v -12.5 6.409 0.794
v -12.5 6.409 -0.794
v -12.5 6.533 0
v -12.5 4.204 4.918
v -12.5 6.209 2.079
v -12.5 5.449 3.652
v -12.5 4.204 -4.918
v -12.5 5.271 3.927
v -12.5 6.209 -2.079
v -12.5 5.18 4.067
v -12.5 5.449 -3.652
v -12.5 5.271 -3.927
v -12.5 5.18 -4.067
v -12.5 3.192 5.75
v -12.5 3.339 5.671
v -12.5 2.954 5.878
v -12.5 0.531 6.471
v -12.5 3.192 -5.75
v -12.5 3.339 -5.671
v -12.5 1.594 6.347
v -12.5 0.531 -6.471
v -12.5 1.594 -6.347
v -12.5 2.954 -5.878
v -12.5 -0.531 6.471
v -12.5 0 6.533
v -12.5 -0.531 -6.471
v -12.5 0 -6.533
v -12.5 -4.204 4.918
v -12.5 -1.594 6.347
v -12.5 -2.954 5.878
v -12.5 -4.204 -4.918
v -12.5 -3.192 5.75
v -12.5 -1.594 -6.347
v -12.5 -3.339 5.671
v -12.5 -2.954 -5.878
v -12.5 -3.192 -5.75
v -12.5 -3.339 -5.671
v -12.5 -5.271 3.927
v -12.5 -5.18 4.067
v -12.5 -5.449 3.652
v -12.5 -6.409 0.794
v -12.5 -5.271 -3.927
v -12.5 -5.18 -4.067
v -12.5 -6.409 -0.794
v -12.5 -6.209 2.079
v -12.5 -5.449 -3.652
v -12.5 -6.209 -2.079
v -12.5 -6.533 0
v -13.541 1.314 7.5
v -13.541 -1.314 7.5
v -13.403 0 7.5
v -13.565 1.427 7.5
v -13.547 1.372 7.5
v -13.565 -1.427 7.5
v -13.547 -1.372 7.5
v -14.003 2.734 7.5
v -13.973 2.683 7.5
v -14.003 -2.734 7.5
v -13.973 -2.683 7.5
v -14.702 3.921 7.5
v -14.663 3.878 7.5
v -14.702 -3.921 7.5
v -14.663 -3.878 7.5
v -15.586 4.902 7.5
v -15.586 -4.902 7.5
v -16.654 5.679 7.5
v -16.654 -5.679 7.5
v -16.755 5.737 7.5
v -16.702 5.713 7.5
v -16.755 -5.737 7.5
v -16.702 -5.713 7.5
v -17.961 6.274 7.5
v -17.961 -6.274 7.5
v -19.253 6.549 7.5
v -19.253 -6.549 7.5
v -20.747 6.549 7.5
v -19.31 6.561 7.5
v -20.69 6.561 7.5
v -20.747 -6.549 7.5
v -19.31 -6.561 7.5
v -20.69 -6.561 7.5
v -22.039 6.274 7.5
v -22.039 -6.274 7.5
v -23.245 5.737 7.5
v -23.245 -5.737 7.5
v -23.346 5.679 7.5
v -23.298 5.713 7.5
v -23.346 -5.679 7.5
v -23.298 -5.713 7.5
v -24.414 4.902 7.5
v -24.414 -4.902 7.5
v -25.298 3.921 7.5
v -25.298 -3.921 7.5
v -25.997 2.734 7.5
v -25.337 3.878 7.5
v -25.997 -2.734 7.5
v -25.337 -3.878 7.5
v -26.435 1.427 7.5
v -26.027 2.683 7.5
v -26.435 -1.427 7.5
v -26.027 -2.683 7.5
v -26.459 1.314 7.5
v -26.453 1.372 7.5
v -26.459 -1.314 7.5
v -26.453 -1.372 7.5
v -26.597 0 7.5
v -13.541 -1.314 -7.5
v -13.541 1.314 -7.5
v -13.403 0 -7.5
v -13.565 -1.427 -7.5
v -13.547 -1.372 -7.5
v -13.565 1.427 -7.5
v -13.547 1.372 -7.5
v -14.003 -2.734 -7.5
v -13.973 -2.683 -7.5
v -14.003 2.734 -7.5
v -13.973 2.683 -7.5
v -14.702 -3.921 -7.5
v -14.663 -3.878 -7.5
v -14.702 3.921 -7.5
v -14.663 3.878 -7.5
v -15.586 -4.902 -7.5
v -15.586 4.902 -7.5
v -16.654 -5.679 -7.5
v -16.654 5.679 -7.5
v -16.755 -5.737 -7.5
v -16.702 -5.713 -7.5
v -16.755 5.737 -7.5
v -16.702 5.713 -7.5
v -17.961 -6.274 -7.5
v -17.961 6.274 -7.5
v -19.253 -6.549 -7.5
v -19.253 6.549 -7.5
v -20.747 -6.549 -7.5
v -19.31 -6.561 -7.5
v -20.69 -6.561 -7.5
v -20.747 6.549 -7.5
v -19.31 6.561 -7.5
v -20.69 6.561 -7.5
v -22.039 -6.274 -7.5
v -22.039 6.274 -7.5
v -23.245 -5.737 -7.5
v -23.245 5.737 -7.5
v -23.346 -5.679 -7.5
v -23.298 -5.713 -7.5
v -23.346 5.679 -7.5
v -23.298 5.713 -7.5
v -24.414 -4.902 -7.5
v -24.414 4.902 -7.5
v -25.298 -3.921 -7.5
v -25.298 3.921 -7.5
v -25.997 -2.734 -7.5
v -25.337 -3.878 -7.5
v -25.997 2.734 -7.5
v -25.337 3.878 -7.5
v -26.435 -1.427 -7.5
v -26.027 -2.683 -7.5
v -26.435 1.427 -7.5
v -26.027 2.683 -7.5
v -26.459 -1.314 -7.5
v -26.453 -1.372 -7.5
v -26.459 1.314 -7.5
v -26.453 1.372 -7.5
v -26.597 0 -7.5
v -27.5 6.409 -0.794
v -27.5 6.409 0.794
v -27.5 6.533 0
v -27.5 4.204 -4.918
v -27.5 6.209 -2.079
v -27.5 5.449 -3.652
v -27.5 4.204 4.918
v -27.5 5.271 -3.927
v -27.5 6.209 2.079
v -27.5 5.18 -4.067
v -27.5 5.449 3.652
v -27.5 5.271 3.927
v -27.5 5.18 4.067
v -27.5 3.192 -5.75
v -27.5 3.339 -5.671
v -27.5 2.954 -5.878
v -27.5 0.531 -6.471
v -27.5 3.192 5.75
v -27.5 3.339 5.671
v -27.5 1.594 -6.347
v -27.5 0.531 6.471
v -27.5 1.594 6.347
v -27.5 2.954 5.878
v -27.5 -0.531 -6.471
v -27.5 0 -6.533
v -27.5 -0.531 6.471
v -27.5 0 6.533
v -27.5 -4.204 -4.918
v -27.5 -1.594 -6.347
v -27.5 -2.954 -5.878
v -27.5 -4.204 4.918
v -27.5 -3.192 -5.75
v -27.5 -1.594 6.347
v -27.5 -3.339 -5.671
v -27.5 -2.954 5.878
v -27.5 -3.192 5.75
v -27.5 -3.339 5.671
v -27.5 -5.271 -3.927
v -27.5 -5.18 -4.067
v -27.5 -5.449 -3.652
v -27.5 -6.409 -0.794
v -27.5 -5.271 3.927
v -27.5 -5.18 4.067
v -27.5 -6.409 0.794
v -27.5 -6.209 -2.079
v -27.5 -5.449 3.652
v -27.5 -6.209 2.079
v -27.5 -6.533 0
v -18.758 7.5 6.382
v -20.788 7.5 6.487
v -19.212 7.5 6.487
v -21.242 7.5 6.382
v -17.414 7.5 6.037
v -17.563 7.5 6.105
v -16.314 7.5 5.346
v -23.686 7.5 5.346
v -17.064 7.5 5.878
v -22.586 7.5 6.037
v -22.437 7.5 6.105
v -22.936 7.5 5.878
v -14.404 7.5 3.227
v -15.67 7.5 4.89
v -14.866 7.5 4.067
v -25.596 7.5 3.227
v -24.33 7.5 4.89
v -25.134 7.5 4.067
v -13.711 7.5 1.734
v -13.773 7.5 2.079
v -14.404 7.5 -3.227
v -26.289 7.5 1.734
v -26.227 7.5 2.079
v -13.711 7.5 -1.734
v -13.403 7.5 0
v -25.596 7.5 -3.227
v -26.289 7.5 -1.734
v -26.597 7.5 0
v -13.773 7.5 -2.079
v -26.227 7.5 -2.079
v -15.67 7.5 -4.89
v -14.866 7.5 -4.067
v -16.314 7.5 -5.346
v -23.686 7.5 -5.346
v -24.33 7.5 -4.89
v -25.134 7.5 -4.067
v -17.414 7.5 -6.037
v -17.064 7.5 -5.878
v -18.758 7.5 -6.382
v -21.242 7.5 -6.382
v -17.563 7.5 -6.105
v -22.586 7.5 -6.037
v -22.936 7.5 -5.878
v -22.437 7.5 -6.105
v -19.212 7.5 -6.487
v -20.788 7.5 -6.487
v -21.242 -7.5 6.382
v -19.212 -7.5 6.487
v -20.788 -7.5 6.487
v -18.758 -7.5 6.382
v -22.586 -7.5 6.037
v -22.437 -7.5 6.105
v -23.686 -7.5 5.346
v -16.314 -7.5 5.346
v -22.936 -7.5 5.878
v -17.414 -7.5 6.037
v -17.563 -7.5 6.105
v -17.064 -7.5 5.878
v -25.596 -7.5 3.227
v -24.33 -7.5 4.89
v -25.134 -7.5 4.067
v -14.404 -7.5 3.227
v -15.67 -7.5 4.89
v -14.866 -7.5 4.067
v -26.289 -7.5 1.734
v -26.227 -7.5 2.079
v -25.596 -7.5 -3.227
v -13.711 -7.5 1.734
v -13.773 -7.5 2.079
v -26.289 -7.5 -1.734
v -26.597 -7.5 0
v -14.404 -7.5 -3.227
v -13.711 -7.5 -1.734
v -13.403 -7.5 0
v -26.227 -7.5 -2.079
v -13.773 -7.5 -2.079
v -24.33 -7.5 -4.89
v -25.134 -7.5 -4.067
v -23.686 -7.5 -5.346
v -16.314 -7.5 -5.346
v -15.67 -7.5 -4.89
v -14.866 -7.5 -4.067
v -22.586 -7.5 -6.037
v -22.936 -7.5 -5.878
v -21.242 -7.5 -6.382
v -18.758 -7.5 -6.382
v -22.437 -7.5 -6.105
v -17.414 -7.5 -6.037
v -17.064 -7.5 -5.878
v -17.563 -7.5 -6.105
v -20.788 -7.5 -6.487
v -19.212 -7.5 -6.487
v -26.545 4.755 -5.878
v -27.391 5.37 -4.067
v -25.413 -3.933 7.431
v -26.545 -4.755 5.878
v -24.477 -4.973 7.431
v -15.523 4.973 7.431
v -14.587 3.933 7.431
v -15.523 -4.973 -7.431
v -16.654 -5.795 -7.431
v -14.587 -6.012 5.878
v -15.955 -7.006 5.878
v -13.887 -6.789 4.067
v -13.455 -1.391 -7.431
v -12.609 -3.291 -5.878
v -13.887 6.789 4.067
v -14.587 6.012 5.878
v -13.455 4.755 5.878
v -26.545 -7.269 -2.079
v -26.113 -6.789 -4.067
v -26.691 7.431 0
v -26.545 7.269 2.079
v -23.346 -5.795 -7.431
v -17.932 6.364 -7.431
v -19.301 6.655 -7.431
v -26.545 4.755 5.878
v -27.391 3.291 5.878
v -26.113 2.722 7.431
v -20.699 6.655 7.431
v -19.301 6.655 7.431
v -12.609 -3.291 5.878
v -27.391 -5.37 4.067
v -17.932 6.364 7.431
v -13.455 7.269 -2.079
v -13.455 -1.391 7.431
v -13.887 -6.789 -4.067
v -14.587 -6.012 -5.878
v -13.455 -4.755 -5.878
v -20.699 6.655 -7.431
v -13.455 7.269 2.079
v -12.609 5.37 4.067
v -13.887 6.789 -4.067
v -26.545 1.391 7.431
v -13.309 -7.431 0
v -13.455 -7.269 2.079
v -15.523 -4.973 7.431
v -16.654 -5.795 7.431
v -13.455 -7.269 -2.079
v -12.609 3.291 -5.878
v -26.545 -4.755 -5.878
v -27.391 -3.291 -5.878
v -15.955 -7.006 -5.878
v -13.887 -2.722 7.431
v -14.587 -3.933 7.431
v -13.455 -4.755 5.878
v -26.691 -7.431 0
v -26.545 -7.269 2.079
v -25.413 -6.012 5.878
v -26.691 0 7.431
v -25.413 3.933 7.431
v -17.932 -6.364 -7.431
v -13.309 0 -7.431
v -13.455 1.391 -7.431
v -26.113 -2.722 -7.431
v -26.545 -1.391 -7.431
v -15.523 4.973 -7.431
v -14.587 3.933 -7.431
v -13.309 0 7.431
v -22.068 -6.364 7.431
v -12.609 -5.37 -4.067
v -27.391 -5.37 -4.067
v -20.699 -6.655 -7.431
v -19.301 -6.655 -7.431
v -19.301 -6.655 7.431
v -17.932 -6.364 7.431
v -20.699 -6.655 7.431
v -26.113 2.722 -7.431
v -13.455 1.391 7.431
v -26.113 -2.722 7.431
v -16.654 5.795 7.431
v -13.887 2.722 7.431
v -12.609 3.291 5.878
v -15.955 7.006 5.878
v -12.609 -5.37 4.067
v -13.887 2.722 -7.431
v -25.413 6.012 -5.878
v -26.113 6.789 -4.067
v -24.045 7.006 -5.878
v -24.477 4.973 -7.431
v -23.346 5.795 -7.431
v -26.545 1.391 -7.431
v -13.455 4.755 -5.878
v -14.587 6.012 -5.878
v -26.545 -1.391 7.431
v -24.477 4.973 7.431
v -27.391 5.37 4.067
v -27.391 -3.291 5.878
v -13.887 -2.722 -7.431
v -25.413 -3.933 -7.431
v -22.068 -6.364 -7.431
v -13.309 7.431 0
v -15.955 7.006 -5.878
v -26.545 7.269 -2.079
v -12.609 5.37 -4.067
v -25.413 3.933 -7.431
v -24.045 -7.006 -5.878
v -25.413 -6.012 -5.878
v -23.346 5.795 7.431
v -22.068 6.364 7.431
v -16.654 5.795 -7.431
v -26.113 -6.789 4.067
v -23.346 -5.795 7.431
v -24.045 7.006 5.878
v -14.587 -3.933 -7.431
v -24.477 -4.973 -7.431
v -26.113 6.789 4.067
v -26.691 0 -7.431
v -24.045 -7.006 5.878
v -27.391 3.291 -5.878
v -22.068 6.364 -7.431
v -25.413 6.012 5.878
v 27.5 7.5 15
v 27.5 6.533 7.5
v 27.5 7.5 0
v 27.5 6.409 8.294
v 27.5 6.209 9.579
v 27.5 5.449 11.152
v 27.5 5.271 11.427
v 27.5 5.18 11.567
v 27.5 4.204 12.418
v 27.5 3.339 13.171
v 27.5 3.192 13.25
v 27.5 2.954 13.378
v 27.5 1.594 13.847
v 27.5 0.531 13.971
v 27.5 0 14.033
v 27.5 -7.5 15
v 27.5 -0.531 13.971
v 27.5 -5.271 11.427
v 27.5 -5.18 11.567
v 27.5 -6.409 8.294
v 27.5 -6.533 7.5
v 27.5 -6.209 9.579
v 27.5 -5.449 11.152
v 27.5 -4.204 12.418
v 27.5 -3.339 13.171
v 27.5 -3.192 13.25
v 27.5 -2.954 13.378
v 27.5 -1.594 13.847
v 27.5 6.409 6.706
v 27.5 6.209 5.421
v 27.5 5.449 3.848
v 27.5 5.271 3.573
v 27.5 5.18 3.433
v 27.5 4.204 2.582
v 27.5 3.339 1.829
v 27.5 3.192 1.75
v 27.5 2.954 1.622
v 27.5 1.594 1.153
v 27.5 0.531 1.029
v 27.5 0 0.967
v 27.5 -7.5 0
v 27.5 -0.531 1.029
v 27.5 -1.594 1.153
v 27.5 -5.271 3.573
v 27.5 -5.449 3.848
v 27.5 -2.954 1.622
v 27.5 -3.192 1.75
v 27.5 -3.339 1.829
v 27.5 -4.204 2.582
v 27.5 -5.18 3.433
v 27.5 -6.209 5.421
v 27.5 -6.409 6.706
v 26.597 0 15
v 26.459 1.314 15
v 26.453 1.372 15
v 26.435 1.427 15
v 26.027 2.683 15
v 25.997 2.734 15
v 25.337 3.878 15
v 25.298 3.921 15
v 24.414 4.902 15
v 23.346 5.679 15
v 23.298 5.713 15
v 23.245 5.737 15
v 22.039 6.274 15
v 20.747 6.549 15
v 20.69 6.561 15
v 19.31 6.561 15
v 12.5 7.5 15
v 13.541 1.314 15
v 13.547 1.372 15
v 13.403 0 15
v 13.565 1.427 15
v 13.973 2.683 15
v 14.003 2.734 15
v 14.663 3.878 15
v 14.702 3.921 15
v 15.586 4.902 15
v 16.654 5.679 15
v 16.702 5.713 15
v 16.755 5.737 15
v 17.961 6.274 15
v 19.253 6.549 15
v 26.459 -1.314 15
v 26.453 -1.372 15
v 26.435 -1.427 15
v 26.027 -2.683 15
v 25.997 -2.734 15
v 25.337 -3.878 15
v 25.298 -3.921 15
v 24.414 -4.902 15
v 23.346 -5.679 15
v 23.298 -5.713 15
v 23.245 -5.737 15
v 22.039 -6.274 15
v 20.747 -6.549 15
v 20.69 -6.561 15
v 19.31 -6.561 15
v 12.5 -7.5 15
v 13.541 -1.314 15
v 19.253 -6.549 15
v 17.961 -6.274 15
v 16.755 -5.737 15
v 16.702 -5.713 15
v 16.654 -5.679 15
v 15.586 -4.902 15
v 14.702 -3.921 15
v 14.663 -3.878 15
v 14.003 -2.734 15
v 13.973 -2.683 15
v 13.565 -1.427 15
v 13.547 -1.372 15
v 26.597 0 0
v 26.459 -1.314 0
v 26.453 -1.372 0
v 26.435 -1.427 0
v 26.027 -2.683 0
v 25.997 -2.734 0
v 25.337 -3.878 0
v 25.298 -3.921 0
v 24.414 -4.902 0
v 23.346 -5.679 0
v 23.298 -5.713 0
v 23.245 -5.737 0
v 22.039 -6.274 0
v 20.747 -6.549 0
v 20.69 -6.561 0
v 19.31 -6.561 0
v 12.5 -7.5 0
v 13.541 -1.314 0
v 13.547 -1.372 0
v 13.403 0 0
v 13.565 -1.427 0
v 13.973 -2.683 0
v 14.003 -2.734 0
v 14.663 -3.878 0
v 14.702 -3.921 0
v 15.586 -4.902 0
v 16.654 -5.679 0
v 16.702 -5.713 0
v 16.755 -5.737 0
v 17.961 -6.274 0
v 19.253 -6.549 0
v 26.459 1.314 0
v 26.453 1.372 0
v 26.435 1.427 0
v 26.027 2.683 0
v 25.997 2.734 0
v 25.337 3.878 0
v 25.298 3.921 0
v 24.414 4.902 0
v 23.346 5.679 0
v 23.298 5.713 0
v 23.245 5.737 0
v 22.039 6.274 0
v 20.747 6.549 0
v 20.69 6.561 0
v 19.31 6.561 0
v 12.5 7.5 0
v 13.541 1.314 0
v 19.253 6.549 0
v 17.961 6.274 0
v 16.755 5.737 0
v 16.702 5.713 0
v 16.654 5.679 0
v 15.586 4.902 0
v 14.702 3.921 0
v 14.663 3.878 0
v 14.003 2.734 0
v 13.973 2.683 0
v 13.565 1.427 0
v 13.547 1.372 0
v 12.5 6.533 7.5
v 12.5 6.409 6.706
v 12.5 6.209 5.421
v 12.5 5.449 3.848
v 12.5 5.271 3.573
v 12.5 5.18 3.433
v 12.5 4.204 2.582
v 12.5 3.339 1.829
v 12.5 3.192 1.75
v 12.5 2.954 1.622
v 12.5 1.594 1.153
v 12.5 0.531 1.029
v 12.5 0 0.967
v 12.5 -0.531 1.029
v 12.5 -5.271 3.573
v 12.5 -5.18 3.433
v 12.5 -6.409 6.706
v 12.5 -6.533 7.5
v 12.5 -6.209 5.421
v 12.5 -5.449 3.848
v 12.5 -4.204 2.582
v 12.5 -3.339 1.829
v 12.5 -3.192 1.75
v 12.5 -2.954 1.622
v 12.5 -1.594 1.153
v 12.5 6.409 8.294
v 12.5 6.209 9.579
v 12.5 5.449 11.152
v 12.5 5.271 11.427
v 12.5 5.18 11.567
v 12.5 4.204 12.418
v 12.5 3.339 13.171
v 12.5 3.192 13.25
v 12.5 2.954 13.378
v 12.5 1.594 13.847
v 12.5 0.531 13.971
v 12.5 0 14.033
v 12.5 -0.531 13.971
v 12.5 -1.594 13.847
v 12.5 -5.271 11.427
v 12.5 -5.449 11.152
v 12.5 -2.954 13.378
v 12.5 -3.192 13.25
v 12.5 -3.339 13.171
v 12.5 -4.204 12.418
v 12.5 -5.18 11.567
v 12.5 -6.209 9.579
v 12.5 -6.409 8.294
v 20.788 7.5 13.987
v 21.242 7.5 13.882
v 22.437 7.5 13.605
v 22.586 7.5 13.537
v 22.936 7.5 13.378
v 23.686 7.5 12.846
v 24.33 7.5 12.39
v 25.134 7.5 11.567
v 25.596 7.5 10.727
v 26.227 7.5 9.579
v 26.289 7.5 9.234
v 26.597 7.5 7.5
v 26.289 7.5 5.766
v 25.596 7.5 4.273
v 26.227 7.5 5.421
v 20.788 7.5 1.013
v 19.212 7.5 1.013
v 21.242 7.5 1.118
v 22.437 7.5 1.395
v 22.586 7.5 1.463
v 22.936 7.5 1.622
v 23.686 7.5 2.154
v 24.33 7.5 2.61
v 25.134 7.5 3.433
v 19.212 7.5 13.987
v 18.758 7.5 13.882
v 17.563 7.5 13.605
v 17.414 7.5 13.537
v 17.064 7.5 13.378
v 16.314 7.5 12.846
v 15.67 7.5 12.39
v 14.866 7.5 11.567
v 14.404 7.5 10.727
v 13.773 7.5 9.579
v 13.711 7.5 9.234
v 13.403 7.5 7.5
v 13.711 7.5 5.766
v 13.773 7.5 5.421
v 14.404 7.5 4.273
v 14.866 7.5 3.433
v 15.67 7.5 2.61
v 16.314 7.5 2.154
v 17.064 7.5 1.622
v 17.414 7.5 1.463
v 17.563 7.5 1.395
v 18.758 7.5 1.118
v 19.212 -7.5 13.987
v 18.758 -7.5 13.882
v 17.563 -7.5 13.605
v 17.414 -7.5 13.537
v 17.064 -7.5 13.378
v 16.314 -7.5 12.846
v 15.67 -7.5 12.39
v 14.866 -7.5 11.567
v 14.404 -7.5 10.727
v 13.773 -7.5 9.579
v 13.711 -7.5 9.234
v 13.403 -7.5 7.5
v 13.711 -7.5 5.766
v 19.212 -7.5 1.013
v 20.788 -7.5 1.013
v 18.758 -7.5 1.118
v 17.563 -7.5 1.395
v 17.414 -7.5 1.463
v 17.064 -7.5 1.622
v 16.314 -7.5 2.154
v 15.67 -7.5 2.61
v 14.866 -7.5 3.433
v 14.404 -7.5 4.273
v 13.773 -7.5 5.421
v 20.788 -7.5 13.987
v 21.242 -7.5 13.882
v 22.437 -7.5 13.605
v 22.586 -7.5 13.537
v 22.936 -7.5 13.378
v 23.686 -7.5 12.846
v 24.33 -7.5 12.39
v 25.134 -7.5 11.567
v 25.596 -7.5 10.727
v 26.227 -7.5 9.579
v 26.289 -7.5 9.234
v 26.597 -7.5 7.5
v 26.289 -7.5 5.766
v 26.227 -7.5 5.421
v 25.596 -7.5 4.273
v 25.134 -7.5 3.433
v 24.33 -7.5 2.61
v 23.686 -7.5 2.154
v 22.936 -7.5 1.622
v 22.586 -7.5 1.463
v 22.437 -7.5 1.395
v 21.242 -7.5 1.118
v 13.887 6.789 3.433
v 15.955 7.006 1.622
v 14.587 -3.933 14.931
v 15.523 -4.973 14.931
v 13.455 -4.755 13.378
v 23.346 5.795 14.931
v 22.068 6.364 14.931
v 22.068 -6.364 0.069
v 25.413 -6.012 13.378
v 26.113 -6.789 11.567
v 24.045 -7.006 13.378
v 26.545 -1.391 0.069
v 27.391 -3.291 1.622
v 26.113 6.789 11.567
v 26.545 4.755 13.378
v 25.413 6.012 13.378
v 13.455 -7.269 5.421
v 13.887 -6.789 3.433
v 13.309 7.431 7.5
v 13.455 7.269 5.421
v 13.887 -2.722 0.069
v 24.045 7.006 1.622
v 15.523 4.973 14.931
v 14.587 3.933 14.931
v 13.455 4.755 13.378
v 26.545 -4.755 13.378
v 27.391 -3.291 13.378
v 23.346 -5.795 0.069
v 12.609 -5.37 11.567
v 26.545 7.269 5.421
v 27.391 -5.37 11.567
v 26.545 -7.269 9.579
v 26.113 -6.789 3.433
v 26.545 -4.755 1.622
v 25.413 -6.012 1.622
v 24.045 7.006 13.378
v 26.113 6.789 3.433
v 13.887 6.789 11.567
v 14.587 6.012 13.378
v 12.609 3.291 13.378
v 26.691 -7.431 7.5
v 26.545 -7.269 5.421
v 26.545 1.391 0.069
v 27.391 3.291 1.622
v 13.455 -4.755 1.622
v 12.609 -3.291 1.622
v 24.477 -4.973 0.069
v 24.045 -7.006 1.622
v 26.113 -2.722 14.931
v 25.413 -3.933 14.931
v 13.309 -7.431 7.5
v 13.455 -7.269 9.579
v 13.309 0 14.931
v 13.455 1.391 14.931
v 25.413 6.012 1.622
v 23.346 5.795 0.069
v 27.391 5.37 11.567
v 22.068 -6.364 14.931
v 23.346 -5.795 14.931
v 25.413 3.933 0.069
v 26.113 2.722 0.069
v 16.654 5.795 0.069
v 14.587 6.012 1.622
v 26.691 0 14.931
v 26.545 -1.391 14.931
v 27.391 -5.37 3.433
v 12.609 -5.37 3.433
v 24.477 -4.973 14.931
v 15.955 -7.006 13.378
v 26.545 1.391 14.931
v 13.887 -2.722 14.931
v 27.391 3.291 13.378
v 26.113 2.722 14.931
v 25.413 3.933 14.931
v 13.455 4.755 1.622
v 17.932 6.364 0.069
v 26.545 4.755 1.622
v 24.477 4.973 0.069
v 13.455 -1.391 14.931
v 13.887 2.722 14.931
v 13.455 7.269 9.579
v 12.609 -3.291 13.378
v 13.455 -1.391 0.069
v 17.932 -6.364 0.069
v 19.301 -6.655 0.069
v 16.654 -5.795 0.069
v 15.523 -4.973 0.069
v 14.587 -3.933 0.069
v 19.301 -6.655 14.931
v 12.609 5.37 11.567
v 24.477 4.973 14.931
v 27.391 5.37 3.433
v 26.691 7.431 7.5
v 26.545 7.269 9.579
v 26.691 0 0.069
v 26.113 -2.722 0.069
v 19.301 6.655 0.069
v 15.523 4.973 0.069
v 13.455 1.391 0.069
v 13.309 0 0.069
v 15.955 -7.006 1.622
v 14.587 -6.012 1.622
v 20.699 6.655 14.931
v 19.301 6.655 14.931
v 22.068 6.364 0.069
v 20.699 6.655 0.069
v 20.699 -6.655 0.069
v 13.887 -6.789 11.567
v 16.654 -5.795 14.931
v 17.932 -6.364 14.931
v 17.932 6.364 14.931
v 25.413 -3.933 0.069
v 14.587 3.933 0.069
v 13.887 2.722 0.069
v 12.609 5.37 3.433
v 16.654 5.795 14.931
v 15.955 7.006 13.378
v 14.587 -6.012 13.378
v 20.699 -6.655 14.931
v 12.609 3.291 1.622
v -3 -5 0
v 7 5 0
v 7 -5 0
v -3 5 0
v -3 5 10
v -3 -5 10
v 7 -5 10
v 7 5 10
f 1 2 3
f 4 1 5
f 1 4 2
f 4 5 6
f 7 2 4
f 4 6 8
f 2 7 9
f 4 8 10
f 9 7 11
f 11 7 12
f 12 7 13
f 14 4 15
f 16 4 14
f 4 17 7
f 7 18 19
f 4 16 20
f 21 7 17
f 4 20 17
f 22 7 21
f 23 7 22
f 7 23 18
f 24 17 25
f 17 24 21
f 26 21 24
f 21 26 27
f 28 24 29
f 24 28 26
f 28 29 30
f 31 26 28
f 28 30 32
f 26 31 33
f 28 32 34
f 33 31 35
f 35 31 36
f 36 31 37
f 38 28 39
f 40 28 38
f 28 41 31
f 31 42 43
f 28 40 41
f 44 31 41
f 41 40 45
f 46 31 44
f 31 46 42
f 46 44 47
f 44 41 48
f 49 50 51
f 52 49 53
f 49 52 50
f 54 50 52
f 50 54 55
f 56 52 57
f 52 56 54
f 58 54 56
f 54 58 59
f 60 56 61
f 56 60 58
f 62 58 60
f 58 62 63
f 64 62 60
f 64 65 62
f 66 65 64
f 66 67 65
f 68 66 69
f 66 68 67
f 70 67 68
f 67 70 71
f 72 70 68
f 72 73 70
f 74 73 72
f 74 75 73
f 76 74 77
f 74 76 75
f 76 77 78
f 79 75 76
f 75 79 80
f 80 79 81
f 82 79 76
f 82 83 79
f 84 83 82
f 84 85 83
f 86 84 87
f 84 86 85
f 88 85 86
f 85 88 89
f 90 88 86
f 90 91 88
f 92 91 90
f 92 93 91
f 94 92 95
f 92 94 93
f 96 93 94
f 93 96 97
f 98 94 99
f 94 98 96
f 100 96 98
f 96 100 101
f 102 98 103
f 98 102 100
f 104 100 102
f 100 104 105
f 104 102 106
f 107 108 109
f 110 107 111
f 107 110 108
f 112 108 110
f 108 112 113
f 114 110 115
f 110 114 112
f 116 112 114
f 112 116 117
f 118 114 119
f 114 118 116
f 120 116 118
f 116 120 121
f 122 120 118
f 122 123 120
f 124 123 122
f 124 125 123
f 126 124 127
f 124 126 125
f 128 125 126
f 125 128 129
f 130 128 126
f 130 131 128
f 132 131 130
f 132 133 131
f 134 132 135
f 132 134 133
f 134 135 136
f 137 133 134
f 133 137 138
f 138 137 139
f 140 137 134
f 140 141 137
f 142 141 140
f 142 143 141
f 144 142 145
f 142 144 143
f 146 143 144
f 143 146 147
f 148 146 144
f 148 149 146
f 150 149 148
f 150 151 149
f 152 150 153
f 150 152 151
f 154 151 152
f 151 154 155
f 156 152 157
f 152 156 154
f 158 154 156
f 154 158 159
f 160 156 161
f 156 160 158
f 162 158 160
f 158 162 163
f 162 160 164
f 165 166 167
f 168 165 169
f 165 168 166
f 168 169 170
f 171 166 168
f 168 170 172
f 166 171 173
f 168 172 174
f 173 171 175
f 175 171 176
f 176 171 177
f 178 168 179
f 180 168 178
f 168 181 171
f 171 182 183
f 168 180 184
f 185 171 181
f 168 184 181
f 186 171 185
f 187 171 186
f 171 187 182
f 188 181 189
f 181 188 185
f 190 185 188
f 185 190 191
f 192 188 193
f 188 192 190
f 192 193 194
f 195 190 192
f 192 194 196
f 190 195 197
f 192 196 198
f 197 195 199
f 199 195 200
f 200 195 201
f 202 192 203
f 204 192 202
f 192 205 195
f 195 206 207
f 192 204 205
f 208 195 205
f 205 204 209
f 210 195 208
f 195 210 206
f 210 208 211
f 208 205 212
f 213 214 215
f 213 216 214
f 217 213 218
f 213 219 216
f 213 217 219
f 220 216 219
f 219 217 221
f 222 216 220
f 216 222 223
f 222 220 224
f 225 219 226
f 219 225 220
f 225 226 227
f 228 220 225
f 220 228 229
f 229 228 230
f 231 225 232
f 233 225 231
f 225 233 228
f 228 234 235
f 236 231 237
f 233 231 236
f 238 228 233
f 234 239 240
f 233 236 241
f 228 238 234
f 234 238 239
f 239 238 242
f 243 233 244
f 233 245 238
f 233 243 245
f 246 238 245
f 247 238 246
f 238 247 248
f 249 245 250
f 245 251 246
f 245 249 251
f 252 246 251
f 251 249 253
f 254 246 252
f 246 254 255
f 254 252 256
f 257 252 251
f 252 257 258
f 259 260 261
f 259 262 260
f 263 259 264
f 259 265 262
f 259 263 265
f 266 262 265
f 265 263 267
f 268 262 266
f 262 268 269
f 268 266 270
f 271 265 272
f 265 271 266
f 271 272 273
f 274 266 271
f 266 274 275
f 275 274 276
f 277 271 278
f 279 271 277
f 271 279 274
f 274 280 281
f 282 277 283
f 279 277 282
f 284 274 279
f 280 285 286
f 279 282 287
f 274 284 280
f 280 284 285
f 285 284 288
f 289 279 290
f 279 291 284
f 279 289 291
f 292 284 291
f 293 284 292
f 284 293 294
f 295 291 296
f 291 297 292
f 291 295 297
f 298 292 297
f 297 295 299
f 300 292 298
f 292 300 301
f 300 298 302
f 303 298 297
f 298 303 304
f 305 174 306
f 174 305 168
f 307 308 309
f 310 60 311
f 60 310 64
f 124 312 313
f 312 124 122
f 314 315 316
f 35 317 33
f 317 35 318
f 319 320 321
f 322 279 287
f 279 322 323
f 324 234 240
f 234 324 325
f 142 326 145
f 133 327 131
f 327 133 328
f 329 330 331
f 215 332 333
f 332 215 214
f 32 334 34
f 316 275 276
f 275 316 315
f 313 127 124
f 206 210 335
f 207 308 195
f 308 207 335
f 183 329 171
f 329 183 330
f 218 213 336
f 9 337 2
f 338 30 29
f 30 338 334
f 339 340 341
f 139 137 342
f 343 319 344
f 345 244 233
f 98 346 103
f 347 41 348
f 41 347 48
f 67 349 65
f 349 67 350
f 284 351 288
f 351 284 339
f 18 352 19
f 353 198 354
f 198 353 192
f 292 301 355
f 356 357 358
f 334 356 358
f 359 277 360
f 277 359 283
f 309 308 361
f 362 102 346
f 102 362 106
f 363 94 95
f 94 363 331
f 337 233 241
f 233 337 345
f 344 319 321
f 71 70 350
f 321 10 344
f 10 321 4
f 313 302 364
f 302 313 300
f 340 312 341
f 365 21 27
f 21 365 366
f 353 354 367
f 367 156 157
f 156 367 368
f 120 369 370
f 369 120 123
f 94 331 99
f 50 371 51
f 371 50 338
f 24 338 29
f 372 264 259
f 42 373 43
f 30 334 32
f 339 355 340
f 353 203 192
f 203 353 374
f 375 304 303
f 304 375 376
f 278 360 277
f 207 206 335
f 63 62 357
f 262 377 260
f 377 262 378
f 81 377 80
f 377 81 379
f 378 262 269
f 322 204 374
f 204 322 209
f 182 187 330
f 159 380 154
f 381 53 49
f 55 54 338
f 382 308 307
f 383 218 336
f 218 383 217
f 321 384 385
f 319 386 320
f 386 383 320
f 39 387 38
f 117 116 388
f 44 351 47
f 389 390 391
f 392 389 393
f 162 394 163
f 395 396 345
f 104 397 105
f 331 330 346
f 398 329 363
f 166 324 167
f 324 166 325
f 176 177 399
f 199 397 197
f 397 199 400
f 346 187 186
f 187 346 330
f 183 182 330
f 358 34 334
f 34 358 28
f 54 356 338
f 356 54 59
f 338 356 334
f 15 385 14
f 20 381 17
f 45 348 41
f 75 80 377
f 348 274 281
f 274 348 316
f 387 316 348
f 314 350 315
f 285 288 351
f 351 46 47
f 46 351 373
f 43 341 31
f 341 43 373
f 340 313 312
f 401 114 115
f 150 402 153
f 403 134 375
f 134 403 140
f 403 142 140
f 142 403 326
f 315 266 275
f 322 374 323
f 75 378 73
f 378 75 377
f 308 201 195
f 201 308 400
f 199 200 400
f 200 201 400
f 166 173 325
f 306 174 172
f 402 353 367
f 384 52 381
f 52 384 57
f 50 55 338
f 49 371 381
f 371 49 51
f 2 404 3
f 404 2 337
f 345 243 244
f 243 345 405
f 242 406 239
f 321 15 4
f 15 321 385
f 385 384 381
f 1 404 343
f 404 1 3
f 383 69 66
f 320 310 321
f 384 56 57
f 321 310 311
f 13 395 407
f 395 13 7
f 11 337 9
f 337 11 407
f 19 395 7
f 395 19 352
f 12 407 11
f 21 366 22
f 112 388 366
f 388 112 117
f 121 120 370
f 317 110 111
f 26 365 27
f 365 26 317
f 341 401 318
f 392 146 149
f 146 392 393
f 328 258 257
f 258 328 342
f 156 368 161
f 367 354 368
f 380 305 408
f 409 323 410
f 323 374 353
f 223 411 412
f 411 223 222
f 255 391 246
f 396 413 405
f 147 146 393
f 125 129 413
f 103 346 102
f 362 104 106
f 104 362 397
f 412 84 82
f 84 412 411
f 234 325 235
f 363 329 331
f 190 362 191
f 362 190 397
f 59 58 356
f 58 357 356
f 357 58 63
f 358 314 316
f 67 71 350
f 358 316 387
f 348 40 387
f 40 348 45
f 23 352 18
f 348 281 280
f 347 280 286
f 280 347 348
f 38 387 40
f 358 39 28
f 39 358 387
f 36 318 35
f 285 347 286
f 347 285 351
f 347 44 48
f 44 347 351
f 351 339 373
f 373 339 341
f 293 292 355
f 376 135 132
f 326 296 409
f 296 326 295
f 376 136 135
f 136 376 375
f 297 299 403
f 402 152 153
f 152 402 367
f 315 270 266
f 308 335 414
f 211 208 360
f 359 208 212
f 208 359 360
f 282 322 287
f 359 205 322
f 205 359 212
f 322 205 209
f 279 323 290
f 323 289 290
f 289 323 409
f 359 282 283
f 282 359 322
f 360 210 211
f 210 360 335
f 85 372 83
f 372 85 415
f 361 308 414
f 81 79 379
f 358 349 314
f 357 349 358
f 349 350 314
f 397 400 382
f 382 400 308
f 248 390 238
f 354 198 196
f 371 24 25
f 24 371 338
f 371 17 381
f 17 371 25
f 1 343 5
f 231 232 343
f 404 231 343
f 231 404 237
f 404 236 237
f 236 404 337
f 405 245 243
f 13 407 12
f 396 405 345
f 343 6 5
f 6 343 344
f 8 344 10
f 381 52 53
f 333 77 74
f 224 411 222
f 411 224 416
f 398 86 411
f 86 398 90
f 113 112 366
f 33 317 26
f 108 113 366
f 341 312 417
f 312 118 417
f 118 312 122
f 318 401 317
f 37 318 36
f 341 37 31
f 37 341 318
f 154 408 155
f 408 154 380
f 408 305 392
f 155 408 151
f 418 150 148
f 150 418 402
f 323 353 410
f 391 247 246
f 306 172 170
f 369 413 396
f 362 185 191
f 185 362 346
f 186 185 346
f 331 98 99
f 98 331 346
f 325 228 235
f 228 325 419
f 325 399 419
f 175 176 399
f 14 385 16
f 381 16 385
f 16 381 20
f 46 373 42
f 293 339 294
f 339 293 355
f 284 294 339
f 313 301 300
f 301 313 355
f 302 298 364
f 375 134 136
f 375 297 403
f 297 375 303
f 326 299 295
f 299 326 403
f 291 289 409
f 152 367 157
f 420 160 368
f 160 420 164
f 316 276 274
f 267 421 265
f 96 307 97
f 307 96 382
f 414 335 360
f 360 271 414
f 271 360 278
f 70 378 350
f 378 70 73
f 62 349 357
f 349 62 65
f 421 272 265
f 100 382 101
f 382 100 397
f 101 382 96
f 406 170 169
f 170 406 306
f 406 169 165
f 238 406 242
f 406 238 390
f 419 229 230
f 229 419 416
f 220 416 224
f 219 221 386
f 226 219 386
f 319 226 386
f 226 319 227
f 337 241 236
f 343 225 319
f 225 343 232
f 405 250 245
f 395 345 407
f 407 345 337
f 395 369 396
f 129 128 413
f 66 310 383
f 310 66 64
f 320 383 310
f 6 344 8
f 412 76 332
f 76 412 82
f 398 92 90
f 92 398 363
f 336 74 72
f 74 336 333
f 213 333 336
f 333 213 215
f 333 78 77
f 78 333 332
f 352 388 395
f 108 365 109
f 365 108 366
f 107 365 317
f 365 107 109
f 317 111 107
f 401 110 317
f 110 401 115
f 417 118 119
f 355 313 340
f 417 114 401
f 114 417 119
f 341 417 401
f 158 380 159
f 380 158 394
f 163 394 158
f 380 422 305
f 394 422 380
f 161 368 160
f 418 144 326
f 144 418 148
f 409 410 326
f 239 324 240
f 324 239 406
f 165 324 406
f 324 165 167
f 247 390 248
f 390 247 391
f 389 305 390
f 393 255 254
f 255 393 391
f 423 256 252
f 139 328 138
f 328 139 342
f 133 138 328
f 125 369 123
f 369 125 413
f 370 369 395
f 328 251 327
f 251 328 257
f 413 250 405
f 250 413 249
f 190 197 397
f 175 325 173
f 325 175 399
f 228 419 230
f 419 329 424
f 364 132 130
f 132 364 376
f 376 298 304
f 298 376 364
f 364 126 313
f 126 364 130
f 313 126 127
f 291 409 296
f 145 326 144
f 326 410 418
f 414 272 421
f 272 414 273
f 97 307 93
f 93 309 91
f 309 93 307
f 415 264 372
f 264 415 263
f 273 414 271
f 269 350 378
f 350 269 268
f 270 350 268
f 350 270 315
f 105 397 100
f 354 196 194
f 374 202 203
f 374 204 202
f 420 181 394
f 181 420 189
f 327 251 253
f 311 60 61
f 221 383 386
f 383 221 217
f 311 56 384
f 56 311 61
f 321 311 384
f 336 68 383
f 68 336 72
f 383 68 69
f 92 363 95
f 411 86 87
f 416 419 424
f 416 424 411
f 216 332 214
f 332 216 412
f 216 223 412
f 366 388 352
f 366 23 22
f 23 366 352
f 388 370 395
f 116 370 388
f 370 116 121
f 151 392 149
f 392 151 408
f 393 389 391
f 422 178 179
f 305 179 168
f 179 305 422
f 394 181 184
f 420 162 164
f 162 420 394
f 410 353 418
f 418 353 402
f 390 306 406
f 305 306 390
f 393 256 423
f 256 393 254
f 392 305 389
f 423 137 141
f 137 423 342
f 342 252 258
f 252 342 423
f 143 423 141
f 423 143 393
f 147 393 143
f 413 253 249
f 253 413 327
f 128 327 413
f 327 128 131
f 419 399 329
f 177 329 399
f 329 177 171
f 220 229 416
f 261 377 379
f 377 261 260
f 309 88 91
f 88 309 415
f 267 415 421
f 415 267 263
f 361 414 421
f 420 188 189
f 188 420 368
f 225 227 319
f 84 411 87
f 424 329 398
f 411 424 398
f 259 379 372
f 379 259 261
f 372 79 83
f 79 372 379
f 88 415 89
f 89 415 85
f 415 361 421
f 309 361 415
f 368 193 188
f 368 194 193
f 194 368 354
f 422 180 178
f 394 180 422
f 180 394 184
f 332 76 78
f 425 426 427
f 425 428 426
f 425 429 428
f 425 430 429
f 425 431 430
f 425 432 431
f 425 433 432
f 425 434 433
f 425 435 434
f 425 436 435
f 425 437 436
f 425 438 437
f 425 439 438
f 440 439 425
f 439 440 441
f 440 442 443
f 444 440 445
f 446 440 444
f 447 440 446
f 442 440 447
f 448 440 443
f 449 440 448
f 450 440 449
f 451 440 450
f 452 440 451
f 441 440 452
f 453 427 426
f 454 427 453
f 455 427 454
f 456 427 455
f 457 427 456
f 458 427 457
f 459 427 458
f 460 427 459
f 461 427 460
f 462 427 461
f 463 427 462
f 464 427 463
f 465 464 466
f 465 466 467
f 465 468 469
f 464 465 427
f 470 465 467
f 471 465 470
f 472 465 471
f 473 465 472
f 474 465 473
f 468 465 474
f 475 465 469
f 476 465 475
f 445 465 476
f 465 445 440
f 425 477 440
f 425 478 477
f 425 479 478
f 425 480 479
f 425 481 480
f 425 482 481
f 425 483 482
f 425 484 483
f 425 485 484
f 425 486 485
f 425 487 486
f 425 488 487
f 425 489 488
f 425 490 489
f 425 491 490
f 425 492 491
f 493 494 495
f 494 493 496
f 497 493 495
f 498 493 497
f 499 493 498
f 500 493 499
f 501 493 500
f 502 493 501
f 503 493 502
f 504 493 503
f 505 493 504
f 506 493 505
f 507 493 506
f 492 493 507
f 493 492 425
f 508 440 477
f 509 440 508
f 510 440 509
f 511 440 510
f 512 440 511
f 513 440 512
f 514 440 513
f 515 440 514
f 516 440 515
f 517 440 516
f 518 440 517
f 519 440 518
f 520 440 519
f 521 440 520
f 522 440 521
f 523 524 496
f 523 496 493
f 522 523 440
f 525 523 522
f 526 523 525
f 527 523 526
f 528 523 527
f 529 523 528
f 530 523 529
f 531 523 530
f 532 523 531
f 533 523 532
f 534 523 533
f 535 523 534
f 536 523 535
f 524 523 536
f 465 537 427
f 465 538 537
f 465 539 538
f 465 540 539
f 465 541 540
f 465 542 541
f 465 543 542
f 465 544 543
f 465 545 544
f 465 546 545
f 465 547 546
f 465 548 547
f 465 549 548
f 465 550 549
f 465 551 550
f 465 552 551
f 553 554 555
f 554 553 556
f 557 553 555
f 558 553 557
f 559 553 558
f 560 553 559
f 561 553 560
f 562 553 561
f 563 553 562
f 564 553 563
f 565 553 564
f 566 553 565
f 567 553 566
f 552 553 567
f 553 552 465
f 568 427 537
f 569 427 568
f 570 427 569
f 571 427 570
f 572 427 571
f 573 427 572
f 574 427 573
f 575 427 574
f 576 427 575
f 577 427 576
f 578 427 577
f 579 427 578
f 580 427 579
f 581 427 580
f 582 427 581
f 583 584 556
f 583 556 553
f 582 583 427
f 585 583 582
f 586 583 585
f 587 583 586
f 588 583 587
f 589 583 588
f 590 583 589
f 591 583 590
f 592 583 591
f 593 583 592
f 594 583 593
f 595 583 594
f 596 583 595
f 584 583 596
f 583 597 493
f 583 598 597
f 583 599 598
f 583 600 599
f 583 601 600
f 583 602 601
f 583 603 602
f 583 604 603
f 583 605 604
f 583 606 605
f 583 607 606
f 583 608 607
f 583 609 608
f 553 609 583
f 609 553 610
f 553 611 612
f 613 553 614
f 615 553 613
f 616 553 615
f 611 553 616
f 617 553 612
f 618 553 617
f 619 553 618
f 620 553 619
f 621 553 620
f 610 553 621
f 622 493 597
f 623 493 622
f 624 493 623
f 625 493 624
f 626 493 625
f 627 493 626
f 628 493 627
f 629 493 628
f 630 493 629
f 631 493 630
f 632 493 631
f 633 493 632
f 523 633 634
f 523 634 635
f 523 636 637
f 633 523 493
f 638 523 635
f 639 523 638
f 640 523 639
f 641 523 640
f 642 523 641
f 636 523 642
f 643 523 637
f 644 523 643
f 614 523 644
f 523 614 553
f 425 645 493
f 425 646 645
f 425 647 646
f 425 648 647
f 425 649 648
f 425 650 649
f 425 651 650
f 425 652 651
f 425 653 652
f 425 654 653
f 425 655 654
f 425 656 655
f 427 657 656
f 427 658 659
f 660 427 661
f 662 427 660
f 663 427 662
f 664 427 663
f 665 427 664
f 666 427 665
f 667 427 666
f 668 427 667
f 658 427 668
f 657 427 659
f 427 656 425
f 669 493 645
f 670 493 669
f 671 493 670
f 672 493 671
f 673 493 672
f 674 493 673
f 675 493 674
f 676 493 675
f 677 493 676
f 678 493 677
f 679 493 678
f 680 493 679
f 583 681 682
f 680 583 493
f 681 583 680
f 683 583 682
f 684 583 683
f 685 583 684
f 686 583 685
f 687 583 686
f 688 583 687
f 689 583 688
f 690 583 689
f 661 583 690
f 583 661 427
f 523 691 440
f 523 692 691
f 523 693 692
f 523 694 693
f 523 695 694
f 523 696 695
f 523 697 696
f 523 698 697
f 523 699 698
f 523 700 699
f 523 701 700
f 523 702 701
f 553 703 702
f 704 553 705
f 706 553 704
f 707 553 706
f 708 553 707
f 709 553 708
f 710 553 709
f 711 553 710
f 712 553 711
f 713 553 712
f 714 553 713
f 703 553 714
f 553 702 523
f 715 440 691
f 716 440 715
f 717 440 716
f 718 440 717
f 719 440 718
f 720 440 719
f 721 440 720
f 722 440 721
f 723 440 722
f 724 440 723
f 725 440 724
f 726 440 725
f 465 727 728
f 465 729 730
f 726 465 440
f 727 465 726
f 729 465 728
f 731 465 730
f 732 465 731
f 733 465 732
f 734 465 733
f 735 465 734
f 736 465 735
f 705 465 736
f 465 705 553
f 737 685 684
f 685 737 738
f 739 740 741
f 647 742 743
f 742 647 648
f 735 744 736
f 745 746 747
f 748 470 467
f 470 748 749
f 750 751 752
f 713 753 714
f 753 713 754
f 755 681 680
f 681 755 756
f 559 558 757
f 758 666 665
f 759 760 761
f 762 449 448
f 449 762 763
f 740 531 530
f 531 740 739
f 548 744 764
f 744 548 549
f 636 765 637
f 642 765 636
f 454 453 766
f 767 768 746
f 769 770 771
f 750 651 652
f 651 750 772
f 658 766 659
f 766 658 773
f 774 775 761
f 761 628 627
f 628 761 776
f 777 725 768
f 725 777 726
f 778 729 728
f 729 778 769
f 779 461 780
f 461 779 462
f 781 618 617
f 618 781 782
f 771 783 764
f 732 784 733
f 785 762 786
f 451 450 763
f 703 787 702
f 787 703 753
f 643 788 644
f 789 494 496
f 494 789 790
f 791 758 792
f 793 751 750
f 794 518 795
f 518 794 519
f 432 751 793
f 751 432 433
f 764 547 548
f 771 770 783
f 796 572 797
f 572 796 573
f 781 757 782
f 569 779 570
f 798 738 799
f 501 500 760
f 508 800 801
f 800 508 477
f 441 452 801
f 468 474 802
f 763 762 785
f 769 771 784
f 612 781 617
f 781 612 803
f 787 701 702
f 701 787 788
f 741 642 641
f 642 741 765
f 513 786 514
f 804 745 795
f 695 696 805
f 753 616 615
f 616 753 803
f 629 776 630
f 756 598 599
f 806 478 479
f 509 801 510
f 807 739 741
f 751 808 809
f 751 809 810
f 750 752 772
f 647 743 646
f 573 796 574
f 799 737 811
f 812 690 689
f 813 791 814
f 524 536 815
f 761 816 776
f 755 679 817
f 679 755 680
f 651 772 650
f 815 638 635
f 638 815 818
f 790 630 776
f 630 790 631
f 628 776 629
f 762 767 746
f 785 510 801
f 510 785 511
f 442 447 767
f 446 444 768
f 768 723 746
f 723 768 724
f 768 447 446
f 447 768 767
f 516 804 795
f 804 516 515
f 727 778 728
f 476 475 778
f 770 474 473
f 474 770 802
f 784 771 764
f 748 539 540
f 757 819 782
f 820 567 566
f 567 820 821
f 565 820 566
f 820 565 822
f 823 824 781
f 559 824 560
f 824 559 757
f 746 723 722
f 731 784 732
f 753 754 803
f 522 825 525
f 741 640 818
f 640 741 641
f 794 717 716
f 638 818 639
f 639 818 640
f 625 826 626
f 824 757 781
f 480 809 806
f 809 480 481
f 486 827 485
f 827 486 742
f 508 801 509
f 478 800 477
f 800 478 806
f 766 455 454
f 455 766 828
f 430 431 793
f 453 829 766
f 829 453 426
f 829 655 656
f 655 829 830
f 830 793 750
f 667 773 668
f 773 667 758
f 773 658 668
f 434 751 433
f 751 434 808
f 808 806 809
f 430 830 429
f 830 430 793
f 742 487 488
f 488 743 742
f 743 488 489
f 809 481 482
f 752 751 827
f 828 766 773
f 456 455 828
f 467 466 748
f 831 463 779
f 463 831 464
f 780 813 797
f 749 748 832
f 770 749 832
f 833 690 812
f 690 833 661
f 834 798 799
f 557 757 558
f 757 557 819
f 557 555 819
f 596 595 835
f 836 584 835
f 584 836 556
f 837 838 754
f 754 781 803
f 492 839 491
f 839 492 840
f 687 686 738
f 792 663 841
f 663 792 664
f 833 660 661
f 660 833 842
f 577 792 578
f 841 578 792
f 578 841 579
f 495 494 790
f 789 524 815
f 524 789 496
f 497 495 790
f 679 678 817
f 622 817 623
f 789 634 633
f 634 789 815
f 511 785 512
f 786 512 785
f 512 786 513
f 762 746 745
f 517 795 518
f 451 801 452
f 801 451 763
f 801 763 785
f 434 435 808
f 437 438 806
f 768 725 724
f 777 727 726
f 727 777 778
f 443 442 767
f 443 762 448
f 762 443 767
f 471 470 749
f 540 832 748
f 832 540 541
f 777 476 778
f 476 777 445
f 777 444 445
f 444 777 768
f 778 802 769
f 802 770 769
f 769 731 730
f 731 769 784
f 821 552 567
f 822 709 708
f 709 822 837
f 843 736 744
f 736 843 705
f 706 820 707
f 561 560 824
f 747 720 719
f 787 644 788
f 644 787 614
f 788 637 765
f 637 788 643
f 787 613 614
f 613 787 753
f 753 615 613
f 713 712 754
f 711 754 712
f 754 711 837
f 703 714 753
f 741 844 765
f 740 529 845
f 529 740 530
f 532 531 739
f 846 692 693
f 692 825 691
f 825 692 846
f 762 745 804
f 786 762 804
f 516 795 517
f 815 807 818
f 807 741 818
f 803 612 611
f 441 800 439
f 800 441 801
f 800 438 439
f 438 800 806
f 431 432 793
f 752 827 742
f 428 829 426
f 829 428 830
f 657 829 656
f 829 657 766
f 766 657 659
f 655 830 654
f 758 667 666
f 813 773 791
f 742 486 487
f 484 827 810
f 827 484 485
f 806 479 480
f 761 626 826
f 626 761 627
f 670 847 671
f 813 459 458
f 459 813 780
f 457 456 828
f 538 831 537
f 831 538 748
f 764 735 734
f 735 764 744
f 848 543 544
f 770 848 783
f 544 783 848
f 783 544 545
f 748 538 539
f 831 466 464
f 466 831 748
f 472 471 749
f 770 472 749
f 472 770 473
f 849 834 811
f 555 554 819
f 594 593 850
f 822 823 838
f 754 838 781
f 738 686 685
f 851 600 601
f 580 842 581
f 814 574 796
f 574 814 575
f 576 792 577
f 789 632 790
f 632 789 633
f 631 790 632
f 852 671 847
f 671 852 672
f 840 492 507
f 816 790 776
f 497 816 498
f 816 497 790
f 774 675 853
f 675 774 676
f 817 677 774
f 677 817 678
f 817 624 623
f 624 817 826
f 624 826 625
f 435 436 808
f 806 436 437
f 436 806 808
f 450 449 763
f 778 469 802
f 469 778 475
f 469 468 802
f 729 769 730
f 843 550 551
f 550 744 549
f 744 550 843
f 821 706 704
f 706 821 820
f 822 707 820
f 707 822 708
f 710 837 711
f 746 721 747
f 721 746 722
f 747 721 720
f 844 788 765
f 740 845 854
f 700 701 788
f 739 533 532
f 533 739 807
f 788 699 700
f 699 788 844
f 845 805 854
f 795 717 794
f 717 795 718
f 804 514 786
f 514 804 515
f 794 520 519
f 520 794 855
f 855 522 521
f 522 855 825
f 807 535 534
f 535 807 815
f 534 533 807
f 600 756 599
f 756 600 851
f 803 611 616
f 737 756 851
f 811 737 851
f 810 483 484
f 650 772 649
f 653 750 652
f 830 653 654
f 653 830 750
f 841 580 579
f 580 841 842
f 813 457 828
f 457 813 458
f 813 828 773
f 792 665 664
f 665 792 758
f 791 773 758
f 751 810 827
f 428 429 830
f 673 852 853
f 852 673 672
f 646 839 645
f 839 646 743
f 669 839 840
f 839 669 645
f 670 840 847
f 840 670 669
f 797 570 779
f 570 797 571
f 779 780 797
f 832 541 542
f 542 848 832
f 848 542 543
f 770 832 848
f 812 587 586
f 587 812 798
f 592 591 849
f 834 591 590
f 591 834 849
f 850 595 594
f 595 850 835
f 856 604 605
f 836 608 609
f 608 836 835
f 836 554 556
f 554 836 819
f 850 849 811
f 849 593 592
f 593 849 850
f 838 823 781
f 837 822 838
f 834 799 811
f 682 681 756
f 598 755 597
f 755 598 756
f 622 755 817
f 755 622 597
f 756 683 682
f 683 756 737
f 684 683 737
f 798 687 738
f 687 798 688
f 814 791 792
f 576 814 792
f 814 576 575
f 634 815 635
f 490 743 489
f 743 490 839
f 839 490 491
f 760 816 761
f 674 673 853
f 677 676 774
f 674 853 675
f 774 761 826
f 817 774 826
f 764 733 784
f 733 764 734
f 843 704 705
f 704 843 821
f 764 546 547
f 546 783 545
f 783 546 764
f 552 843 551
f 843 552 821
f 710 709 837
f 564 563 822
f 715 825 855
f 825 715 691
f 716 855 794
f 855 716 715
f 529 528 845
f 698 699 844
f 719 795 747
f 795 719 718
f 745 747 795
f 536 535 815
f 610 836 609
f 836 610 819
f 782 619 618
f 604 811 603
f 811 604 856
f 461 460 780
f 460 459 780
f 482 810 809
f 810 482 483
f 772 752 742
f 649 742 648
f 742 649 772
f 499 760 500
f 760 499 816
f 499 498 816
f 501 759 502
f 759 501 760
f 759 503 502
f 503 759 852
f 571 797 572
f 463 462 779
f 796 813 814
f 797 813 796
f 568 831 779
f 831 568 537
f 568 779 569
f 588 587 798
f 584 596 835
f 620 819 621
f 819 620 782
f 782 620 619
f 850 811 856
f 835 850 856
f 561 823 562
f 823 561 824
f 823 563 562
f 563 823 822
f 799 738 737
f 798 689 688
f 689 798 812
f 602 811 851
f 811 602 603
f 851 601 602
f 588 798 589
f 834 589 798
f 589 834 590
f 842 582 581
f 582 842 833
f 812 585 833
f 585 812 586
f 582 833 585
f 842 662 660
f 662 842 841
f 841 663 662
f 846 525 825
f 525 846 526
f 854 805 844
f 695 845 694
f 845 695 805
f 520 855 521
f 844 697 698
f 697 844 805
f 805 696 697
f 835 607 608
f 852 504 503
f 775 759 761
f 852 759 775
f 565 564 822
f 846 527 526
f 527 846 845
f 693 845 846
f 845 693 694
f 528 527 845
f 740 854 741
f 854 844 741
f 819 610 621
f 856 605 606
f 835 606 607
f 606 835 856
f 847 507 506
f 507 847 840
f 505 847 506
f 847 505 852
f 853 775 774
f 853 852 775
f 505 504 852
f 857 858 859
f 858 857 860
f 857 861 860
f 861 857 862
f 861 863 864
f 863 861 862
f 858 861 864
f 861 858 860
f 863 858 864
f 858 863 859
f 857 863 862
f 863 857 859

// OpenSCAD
// CSG.scad - Basic example of CSG usage

translate([-20,0,0]) {
intersection() {
    cube(15, center=true);
    sphere(10);
}
}

translate([20,0,15/2]) {
    difference() {
        cube(15, center=true);
        sphere(10);
    }
}

linear_extrude(height = 10, center = false, convexity = 10)
translate([2, 0, 0])
square(size = [10, 10], center = true);
